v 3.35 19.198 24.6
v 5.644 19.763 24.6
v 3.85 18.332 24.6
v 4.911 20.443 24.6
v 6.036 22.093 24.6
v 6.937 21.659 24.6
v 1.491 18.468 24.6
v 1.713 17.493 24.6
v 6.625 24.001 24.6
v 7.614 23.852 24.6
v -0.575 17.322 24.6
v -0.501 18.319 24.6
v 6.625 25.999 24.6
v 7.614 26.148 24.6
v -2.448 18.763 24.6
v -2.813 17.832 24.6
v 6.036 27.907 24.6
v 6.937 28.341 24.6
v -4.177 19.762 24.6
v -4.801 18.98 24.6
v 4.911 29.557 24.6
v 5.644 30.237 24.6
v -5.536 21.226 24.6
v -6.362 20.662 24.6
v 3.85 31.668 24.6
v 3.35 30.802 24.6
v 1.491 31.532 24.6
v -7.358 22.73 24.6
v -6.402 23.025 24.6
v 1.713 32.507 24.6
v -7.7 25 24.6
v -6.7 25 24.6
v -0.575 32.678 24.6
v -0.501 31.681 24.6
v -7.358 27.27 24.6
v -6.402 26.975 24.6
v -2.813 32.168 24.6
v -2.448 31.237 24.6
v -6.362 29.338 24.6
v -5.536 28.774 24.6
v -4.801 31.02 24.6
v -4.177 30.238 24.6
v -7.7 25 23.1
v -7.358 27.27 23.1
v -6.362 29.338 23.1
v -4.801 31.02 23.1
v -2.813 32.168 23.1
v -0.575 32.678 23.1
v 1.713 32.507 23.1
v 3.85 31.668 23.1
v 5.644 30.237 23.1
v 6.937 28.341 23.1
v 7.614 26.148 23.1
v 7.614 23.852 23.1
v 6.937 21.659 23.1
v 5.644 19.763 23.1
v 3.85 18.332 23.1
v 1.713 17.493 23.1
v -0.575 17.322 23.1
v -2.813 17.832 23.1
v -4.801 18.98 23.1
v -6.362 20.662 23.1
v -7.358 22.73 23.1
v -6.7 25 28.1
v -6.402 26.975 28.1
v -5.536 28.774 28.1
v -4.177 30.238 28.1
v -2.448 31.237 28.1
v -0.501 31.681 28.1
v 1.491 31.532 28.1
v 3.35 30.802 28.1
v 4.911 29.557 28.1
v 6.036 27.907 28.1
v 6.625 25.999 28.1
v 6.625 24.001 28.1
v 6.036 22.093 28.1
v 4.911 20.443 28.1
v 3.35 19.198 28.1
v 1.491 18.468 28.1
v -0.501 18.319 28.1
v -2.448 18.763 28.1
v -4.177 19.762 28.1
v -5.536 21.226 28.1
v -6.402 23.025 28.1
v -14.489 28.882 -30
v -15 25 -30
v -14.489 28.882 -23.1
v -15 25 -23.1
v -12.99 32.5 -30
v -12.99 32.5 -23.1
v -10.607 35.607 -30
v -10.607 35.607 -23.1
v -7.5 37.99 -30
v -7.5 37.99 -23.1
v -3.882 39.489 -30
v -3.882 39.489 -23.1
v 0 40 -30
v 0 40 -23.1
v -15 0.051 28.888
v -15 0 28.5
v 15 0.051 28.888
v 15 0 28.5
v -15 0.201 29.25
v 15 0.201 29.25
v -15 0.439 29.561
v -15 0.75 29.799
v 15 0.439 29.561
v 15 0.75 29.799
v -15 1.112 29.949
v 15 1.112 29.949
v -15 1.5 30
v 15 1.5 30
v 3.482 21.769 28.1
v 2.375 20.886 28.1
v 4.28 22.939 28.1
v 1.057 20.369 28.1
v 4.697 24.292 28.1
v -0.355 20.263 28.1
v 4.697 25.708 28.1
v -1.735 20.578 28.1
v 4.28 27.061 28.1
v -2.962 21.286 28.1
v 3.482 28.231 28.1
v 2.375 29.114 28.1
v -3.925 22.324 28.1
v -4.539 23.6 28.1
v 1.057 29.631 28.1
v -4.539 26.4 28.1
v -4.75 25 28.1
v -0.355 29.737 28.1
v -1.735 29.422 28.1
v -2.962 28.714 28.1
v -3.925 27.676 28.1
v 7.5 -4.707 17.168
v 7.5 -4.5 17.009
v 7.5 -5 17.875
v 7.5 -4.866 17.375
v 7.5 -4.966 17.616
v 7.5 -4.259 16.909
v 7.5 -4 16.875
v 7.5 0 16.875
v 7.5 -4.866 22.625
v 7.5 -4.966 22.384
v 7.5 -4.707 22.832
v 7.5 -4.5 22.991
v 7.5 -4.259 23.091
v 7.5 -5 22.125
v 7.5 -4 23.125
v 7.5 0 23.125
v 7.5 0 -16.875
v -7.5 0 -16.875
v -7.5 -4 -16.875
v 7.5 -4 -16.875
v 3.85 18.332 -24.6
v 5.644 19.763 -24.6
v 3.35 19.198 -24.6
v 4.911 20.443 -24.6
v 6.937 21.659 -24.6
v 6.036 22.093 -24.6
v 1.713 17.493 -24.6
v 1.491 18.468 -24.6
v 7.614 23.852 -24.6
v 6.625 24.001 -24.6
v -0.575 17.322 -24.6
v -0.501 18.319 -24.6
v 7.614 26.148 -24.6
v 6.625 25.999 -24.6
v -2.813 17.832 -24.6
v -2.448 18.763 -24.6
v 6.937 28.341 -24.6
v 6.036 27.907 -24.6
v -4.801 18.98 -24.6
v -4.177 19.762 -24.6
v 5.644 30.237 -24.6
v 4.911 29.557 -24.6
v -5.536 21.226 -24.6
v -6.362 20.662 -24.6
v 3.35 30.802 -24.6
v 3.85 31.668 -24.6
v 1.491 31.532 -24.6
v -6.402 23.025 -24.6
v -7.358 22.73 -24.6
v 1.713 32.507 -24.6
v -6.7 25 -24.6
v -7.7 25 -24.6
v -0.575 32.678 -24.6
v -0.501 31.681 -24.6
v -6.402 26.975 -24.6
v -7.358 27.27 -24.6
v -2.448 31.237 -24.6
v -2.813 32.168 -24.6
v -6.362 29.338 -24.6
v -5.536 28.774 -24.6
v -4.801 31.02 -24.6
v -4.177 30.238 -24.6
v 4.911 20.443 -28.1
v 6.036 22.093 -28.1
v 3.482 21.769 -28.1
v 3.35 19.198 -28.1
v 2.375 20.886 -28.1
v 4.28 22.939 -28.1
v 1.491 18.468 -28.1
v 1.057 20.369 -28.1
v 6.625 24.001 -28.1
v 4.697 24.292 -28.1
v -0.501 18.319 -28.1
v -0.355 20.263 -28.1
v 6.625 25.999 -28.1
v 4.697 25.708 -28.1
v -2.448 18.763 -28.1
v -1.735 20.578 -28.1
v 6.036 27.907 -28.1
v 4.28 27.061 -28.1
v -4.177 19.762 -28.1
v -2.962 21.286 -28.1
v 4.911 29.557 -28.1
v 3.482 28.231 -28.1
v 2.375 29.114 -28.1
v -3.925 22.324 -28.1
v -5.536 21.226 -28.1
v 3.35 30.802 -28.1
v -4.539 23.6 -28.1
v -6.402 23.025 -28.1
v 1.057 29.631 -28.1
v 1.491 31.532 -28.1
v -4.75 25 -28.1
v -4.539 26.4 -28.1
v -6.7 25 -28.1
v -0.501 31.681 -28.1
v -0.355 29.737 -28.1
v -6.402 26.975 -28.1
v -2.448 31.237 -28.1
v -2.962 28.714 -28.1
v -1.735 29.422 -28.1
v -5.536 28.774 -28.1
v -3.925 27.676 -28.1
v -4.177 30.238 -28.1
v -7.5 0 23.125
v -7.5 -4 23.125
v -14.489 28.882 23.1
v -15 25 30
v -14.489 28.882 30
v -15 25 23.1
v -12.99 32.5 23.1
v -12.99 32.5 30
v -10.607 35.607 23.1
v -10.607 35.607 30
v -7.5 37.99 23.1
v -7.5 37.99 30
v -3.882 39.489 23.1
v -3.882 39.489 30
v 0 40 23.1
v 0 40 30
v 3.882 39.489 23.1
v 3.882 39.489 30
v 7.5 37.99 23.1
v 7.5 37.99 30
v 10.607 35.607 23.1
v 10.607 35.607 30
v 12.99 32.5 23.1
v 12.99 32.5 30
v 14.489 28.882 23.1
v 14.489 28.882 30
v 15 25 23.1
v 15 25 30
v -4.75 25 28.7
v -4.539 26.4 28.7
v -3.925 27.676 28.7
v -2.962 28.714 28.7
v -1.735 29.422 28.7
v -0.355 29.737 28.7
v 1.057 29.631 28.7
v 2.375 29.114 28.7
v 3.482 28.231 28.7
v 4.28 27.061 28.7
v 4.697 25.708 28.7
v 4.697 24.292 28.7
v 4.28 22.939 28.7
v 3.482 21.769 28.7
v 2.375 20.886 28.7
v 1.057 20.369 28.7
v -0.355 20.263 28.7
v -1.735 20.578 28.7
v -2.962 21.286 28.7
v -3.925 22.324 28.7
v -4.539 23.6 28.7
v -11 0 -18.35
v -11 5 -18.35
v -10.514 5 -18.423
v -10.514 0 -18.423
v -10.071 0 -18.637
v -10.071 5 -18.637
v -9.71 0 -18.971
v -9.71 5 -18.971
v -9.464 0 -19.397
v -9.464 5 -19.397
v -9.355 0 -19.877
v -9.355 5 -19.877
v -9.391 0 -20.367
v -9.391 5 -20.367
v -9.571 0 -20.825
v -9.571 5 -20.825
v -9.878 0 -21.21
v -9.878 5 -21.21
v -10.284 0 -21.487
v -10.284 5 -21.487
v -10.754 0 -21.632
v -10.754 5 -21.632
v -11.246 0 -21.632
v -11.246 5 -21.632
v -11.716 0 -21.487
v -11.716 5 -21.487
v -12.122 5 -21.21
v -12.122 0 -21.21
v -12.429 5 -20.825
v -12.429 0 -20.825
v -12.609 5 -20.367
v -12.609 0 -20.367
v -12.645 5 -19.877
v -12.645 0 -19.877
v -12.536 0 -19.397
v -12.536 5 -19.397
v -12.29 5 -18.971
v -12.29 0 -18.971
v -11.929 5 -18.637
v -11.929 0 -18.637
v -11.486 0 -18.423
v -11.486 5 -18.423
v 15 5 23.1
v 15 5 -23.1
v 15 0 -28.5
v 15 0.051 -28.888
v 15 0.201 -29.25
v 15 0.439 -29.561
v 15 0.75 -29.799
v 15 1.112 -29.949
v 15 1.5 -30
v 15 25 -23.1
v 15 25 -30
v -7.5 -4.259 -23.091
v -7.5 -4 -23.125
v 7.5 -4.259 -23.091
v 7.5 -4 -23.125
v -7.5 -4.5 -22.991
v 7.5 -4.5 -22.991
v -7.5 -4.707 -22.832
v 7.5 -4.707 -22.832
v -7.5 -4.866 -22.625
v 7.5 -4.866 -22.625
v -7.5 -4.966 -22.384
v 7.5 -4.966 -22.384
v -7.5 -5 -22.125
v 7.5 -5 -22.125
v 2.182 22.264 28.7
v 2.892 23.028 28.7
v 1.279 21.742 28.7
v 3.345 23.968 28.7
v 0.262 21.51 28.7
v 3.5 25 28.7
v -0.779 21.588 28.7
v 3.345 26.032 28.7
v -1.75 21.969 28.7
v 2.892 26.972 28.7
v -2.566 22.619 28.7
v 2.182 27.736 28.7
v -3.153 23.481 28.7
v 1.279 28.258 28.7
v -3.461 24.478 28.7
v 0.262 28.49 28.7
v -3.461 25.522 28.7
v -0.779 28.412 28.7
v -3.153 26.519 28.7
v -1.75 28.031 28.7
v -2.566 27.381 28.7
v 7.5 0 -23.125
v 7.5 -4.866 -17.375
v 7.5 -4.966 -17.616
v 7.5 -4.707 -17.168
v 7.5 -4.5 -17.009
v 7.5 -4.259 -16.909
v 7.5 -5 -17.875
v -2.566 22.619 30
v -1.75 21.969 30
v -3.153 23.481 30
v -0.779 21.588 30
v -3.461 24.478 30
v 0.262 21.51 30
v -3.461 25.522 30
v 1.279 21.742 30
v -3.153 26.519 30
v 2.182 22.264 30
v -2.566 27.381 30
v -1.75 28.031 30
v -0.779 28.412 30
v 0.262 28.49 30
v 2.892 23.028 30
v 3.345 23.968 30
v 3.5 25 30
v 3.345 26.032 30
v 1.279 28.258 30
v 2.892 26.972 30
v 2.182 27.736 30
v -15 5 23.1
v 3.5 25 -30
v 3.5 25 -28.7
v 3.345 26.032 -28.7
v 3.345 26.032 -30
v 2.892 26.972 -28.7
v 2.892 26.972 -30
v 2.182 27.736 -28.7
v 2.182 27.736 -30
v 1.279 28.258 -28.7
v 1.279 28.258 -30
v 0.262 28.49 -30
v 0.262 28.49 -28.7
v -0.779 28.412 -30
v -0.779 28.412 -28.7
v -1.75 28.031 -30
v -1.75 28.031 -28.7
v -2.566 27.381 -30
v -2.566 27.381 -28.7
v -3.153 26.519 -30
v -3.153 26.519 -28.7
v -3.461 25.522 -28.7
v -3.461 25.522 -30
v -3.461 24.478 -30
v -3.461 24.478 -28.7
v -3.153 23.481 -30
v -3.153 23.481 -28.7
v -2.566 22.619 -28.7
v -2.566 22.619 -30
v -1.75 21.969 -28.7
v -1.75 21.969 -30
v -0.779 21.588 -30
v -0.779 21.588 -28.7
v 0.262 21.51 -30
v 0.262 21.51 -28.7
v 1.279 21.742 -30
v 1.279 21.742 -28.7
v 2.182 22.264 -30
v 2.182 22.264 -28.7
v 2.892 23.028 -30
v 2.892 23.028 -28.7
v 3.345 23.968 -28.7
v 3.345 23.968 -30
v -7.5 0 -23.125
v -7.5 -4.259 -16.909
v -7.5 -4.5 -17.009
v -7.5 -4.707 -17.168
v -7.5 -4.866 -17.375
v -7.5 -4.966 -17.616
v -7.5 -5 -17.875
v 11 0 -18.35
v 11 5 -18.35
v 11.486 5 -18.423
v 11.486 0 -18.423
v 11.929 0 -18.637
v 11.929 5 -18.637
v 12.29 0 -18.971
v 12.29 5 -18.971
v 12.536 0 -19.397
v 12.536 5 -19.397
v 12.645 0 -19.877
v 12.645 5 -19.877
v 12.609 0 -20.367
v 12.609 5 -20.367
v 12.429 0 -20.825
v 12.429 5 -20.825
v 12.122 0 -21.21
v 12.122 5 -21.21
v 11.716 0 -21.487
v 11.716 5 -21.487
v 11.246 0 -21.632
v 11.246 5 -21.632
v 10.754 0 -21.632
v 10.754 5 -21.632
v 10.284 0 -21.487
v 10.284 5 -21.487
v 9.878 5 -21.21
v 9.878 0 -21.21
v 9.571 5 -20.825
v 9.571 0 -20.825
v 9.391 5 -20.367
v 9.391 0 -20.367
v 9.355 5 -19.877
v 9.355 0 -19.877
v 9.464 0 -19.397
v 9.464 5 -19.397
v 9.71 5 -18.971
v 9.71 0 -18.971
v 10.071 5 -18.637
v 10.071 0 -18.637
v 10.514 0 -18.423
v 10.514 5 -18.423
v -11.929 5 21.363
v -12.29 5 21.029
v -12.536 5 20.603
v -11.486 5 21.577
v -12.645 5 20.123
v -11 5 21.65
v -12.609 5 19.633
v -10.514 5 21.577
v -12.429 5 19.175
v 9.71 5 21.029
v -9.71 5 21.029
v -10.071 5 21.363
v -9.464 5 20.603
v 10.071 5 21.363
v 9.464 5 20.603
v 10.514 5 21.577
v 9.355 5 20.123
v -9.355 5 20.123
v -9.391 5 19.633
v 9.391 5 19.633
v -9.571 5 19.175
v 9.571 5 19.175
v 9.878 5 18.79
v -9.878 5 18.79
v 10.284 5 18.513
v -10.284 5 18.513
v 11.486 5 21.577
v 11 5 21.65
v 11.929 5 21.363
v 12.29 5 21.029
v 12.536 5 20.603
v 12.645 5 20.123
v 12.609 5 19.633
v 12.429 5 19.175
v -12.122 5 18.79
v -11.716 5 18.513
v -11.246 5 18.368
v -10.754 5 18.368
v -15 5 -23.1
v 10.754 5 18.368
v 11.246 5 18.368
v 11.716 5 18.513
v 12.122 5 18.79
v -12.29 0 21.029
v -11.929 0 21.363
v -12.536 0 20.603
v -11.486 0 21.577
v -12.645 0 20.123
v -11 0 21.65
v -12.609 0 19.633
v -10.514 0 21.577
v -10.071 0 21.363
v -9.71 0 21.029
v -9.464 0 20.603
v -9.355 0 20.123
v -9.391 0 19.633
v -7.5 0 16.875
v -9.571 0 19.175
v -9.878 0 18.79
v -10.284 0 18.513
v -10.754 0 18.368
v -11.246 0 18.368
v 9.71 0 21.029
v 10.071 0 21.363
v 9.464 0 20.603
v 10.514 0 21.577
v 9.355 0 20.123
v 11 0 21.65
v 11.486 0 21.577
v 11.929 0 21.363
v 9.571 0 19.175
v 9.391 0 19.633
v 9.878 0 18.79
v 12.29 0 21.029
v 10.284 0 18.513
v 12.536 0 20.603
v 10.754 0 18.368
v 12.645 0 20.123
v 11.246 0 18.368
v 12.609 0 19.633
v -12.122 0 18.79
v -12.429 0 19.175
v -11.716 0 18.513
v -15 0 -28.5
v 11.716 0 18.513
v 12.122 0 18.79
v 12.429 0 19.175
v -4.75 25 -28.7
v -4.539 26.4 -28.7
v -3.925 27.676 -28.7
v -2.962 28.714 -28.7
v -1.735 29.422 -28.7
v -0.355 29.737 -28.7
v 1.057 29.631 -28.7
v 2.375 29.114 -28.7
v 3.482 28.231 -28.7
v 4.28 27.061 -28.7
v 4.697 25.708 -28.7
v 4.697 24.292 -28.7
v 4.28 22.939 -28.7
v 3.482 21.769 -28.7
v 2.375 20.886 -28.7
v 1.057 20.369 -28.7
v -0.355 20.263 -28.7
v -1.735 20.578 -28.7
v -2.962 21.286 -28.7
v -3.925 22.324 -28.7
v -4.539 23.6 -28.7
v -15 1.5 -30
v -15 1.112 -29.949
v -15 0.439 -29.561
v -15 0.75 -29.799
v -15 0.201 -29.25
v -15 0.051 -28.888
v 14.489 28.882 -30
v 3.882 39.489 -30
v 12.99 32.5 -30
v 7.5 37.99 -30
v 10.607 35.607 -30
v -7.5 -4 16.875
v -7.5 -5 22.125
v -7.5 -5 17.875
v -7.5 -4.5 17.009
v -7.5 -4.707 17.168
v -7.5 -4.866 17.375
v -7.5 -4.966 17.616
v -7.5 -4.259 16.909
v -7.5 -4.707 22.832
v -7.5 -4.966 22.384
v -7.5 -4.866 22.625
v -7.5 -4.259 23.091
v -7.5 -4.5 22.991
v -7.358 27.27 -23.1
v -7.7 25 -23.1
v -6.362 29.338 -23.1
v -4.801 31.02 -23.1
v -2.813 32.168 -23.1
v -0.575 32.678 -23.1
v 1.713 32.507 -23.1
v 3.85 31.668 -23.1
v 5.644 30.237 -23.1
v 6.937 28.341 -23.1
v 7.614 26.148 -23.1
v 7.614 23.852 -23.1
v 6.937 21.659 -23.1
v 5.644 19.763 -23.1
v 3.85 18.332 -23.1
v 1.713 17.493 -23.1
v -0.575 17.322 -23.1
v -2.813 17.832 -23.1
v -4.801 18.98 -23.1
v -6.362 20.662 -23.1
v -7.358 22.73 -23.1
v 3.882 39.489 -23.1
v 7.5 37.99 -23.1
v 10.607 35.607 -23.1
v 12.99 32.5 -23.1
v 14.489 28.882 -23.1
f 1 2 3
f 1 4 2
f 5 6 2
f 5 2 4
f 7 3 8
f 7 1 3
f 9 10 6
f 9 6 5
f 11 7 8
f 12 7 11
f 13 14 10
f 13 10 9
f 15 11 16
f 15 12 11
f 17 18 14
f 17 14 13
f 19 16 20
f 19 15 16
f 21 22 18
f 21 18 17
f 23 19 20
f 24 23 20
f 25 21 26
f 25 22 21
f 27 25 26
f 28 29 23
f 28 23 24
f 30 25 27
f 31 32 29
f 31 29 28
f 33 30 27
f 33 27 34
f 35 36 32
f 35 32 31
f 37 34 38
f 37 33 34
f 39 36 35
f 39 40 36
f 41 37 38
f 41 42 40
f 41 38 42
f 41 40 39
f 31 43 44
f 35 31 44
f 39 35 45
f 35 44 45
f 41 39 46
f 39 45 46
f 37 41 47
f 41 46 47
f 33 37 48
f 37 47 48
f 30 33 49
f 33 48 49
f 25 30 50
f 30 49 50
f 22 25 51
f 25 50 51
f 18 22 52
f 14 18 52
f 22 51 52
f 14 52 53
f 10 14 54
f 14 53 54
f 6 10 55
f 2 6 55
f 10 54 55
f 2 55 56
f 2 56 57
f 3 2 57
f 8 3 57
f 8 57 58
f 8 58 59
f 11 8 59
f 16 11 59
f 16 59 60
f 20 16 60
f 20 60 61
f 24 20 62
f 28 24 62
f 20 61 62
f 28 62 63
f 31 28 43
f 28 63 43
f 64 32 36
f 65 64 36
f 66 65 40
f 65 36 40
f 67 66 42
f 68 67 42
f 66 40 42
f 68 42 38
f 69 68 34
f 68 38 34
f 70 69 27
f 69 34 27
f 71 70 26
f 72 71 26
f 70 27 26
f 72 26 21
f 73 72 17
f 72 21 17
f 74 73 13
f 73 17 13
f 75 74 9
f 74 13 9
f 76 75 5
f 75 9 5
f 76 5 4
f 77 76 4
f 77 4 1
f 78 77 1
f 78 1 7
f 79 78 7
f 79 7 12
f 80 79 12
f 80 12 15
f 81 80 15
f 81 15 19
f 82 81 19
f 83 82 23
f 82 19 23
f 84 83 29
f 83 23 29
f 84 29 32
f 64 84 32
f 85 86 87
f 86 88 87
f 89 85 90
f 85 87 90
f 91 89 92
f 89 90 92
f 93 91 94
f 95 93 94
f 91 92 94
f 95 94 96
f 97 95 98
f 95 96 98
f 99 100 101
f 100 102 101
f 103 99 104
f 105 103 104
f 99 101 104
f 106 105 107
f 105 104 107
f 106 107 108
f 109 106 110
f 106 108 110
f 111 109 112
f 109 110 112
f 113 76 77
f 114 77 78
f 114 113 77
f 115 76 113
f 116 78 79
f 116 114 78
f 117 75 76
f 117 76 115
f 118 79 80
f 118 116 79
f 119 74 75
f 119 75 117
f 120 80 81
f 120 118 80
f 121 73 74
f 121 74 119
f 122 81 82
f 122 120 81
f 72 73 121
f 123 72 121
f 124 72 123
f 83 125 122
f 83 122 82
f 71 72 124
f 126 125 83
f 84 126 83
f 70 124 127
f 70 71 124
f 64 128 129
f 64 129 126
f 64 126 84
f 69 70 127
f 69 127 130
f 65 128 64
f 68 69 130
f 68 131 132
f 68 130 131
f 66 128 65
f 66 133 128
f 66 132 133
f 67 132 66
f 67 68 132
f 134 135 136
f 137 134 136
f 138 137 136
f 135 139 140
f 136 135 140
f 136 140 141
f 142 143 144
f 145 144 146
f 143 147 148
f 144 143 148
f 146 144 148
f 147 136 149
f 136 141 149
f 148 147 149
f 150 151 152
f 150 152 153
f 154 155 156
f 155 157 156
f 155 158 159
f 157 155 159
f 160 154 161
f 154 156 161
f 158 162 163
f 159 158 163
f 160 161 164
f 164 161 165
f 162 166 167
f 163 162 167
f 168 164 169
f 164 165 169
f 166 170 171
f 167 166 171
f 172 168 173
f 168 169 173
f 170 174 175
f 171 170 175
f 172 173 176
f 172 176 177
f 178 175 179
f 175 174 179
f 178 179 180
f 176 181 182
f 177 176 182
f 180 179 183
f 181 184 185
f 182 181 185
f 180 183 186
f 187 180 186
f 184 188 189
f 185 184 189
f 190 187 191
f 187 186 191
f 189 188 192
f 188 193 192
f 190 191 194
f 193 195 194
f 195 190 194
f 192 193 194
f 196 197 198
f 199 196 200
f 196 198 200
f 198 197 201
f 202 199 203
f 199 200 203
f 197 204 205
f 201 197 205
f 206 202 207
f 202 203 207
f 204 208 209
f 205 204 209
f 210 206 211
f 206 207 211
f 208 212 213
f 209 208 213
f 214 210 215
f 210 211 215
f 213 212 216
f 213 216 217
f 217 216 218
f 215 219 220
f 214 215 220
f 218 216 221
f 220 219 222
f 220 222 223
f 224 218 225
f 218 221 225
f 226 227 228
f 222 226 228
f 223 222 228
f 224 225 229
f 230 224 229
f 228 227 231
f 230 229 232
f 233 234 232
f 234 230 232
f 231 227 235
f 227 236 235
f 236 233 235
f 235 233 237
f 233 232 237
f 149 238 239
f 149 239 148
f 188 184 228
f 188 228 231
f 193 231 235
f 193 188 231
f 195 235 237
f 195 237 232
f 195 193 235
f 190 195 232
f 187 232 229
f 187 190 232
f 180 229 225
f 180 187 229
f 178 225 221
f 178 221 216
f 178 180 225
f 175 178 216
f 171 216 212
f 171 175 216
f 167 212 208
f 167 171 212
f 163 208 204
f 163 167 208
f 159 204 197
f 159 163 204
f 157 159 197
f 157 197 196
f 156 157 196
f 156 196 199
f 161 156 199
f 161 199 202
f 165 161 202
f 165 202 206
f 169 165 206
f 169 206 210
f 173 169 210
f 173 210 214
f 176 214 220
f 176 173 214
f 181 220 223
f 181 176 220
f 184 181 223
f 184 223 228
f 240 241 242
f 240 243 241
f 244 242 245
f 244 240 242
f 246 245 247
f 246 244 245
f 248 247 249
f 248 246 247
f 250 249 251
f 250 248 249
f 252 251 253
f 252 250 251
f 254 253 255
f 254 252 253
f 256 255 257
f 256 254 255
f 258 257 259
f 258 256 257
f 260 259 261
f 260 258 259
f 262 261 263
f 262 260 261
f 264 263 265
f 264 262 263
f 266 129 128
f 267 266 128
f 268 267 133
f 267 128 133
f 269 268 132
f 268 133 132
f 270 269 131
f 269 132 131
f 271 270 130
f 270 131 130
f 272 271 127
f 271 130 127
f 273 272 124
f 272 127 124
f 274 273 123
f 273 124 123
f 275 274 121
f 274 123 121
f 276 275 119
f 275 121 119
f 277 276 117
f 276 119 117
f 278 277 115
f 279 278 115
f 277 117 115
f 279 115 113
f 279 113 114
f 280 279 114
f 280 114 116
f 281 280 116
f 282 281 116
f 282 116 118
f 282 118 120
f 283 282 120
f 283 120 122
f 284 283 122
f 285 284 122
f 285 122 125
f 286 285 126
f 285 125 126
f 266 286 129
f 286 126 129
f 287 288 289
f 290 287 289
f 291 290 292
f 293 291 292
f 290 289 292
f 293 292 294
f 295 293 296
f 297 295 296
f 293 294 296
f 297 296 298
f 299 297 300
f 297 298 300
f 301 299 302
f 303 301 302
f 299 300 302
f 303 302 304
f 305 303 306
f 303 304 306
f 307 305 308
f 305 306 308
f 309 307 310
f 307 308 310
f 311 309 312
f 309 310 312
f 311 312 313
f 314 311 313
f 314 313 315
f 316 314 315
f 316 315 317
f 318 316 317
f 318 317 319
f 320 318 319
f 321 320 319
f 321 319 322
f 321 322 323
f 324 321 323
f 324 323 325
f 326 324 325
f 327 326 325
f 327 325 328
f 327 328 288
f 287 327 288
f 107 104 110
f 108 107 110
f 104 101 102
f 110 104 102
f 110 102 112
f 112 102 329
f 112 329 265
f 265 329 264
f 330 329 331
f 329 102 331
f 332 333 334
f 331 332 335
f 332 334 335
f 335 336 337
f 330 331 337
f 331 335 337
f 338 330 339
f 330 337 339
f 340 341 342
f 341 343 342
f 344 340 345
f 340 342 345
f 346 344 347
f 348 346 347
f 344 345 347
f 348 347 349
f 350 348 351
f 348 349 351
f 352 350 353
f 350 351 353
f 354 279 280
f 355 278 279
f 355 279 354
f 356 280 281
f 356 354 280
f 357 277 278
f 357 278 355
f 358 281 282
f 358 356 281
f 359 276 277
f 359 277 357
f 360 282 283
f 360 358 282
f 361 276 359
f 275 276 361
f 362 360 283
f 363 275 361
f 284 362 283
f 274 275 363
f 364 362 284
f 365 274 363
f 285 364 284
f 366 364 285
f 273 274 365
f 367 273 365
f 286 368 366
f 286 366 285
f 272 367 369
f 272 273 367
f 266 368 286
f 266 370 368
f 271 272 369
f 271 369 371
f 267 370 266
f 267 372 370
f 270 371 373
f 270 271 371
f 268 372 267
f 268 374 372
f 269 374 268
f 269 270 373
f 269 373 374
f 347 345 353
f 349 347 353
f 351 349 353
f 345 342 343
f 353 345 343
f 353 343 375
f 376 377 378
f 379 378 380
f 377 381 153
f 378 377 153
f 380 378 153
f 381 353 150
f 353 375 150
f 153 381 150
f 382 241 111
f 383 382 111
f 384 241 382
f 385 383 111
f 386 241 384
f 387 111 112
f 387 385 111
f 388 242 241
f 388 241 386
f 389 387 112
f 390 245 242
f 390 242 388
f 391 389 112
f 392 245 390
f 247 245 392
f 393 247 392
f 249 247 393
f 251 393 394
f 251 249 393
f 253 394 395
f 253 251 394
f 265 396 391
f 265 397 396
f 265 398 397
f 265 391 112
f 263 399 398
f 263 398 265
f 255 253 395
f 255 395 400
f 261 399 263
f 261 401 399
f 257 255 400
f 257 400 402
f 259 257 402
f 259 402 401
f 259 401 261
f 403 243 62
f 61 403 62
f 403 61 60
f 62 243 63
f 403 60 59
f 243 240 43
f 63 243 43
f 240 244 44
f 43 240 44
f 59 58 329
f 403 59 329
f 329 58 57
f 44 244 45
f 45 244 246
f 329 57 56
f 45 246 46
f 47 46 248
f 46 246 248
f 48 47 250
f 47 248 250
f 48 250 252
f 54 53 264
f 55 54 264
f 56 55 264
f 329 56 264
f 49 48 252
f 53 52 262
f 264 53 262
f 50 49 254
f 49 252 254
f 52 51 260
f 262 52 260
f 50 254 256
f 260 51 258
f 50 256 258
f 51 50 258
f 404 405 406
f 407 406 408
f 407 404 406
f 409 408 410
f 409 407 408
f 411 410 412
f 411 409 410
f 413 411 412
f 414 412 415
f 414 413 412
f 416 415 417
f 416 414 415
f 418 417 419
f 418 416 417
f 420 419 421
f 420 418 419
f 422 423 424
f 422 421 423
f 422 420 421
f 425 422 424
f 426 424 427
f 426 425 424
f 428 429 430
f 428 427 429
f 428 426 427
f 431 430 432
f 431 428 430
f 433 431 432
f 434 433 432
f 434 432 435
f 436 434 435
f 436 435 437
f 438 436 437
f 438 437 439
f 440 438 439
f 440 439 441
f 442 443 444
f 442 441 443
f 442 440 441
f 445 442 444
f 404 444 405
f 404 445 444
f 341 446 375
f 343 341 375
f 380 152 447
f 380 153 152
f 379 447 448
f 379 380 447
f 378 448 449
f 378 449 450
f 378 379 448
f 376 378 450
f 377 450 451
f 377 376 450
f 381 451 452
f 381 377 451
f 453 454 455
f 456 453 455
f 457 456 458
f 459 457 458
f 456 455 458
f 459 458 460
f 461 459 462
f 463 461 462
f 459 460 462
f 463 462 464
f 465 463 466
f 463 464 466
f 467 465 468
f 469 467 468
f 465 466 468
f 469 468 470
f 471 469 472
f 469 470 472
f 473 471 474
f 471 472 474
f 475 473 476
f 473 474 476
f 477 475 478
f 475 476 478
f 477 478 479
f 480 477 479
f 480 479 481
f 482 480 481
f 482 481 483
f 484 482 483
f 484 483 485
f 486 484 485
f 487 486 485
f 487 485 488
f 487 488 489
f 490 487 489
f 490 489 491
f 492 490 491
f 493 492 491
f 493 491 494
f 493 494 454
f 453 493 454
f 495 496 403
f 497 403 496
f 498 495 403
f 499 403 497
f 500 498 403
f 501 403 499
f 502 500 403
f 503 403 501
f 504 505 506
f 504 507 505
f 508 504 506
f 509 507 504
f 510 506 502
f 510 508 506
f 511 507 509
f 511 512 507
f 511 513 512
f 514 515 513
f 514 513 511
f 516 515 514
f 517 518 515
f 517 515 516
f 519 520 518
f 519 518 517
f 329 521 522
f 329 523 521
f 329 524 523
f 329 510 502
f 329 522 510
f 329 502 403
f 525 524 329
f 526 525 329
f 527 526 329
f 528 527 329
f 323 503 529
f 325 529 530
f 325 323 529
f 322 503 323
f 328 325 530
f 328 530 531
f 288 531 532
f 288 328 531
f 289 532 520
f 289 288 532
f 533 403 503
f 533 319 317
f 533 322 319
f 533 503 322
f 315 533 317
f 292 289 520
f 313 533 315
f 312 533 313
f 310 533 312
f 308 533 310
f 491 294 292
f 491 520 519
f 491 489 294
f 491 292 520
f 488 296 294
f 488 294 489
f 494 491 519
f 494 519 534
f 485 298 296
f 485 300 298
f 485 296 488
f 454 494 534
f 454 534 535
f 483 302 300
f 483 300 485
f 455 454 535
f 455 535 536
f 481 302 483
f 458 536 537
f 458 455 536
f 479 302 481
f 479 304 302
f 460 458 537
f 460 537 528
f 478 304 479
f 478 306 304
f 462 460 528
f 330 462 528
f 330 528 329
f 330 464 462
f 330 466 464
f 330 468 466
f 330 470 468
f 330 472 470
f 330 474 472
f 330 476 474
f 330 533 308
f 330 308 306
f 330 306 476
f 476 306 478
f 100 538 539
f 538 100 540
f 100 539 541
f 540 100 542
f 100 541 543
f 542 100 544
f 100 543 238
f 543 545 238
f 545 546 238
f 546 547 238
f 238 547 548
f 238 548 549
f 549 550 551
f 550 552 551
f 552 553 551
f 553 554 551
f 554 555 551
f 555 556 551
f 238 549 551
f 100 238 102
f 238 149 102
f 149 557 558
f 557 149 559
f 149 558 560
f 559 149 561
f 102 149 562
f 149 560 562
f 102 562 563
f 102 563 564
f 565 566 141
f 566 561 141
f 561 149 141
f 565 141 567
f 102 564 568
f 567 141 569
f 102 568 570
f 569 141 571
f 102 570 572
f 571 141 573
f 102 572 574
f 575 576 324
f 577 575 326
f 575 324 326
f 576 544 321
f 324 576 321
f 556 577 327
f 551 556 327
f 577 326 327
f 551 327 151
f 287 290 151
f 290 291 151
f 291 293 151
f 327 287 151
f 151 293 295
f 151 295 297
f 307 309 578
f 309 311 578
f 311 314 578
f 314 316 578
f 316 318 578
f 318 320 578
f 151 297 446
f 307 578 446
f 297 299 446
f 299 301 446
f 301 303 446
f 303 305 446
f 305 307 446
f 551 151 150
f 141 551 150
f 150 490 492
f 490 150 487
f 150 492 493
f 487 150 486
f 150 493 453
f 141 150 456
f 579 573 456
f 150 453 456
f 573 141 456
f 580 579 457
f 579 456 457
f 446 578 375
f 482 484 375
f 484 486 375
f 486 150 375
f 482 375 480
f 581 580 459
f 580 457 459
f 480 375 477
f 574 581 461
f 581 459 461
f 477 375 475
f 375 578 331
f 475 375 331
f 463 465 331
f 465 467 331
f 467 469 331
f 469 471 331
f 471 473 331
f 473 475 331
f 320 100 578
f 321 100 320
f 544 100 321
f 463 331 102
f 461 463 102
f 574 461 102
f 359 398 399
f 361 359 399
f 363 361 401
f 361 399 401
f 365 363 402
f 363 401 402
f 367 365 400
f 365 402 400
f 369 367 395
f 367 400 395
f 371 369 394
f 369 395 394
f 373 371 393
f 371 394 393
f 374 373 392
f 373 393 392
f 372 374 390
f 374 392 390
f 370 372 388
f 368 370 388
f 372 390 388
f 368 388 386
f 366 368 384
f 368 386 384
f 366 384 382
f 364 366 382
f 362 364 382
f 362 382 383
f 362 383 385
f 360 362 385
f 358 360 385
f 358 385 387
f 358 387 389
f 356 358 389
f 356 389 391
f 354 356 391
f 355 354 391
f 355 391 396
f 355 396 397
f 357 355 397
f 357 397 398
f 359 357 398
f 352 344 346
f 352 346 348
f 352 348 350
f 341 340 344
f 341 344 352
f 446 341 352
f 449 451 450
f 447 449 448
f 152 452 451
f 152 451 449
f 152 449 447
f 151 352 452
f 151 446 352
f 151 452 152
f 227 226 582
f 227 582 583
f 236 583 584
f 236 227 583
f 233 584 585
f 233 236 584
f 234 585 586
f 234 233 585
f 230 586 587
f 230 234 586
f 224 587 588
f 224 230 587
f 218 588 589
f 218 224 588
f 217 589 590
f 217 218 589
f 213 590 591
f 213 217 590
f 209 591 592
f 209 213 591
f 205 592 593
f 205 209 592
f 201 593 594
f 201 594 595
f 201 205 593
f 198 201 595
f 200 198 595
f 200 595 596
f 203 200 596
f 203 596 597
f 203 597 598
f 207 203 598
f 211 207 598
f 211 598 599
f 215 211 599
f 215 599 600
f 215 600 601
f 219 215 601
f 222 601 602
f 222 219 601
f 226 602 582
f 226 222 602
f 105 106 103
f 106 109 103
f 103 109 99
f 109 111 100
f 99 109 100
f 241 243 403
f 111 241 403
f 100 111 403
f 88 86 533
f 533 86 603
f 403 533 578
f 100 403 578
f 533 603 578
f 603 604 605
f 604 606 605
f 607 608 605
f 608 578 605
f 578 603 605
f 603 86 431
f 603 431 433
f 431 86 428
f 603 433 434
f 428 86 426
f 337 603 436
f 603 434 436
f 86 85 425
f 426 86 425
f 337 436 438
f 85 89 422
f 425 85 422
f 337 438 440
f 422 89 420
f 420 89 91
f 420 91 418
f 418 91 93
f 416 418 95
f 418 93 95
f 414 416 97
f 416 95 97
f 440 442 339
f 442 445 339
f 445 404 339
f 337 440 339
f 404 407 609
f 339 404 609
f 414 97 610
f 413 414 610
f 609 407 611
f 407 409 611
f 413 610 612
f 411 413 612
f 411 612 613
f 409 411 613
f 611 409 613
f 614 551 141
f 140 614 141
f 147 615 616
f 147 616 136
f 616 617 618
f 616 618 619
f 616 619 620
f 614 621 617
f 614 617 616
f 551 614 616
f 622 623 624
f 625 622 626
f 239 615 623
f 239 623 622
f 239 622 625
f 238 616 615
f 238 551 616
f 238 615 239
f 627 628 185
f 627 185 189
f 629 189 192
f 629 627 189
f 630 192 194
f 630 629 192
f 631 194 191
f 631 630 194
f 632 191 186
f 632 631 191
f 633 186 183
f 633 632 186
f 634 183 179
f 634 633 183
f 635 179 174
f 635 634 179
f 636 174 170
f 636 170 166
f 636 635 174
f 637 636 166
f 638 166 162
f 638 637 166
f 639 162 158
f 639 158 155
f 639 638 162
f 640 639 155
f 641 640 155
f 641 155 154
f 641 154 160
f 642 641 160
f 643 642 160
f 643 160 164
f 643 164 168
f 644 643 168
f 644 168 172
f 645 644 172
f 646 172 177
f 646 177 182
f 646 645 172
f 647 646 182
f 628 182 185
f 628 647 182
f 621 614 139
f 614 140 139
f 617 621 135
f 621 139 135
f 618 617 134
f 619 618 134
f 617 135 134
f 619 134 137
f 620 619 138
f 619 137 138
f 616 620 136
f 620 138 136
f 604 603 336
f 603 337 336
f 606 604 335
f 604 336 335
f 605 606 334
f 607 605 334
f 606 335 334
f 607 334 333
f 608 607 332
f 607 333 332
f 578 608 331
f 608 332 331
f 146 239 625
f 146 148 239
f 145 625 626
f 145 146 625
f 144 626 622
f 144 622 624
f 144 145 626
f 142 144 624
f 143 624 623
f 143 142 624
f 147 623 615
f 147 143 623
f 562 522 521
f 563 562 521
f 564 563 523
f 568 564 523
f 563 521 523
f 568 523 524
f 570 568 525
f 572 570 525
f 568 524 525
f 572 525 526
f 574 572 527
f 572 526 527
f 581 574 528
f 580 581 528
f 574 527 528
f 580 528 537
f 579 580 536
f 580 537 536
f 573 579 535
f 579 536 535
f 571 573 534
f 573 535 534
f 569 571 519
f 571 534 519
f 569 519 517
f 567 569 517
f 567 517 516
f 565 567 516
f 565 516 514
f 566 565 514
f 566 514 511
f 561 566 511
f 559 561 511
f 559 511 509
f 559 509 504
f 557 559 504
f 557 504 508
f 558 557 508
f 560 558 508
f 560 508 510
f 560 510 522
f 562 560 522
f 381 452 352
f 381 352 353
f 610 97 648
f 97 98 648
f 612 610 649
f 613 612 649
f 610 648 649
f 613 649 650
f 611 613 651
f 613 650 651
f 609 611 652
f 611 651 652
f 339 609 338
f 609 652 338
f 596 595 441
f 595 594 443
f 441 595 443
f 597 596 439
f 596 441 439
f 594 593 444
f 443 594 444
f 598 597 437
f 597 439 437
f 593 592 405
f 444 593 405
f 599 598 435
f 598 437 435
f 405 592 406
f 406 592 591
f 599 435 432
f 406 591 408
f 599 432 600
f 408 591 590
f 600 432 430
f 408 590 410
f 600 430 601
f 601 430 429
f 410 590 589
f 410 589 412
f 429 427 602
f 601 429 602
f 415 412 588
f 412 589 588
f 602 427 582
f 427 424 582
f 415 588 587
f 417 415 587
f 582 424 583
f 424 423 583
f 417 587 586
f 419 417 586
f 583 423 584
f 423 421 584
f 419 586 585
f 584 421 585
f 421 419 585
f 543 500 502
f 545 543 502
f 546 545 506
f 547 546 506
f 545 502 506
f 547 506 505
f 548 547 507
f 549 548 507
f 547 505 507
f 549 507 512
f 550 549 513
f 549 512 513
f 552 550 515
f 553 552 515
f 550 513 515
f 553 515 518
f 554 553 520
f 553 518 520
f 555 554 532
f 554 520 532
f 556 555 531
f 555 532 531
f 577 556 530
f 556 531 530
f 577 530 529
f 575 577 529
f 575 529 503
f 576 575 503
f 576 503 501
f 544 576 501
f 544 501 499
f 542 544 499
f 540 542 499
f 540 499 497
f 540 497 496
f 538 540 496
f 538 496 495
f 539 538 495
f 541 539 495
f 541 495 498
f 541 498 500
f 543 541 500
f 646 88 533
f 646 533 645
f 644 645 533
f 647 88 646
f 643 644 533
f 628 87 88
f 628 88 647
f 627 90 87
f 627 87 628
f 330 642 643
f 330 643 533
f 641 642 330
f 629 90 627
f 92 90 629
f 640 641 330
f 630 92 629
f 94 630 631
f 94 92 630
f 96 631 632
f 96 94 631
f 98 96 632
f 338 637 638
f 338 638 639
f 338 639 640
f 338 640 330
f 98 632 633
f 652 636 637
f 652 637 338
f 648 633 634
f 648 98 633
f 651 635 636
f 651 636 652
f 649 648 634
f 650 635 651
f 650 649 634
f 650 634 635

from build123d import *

# Parameters (mm, degrees)
SKETCH1_W           = 30
SKETCH1_H           = 60
BOSS_EXTRUDE1_DEPTH = 5
SKETCH3_R           = 3.5
BOSS_EXTRUDE2_DEPTH = 6.9
SKETCH4_R           = 7.7
CUT_EXTRUDE1_DEPTH  = 1.5
SKETCH6_R           = 6.7
CUT_EXTRUDE2_DEPTH  = 3.5
SKETCH9_R           = 4.75
CUT_EXTRUDE4_DEPTH  = 0.6
FILLET1_R           = 15
SKETCH15_R          = 1.65
CUT_EXTRUDE5_DEPTH  = 10
SKETCH16_W          = 15
SKETCH16_H          = 6.25
BOSS_EXTRUDE3_DEPTH = 5
FILLET2_R           = 1.5
FILLET3_R           = 1


with BuildPart() as part:
    # Sketch1 → Boss-Extrude1 (new body)
    with BuildSketch(Plane(origin=(0, 0, 0), x_dir=(1, 0, 0), z_dir=(0, 1, 0))):
        Rectangle(SKETCH1_W, SKETCH1_H)
    extrude(amount=BOSS_EXTRUDE1_DEPTH)

    # Sketch3 → Boss-Extrude2 (add)
    with BuildSketch(Plane.XY.offset(30)):
        Polygon((-15, 5), (15, 5), (15, 25), (15, 40), (-15, 40), (-15, 25), align=None)
        with Locations((0, 25)):
            Circle(SKETCH3_R, mode=Mode.SUBTRACT)
    boss_extrude2 = extrude(amount=-BOSS_EXTRUDE2_DEPTH)

    # Sketch4 → Cut-Extrude1 (cut)
    with BuildSketch(Plane(origin=(0, 0, 23.1), x_dir=(-1, 0, 0), z_dir=(0, 0, -1))):
        with Locations((0, 25)):
            Circle(SKETCH4_R)
    cut_extrude1 = extrude(amount=-CUT_EXTRUDE1_DEPTH, mode=Mode.SUBTRACT)

    # Sketch6 → Cut-Extrude2 (cut)
    with BuildSketch(Plane(origin=(0, 0, 24.6), x_dir=(-1, 0, 0), z_dir=(0, 0, -1))):
        with Locations((0, 25)):
            Circle(SKETCH6_R)
    cut_extrude2 = extrude(amount=-CUT_EXTRUDE2_DEPTH, mode=Mode.SUBTRACT)

    # Sketch9 → Cut-Extrude4 (cut)
    with BuildSketch(Plane(origin=(0, 0, 28.1), x_dir=(-1, 0, 0), z_dir=(0, 0, -1))):
        with Locations((0, 25)):
            Circle(SKETCH9_R)
    cut_extrude4 = extrude(amount=-CUT_EXTRUDE4_DEPTH, mode=Mode.SUBTRACT)

    # Mirror2: Boss-Extrude2, Cut-Extrude1, Cut-Extrude2, Cut-Extrude4 across plane
    add(boss_extrude2.mirror(Plane.XY))
    add(cut_extrude1.mirror(Plane.XY), mode=Mode.SUBTRACT)
    add(cut_extrude2.mirror(Plane.XY), mode=Mode.SUBTRACT)
    add(cut_extrude4.mirror(Plane.XY), mode=Mode.SUBTRACT)

    # Fillet1
    fillet1_edges = [part.edges().sort_by_distance(p)[0] for p in [
        (-15, 40, -26.55),
        (15, 40, -26.55),
        (-15, 40, 26.55),
        (15, 40, 26.55),
    ]]
    fillet(fillet1_edges, radius=FILLET1_R - 0.0001)  # a hair under: the kernel refuses the full size

    # Sketch15 → Cut-Extrude5 (cut)
    with BuildSketch(Plane(origin=(0, 5, 0), x_dir=(1, 0, 0), z_dir=(0, 1, 0))):
        with Locations(Location((-11, -20, 0), (0, 0, 270))):
            Circle(SKETCH15_R)
        with Locations(Location((11, -20, 0), (0, 0, 270))):
            Circle(SKETCH15_R)
        with Locations(Location((-11, 20, 0), (0, 0, 270))):
            Circle(SKETCH15_R)
        with Locations(Location((11, 20, 0), (0, 0, 270))):
            Circle(SKETCH15_R)
    extrude(amount=-CUT_EXTRUDE5_DEPTH, mode=Mode.SUBTRACT)

    # Sketch16 → Boss-Extrude3 (add)
    with BuildSketch(Plane.XZ):
        with Locations((0, 20)):
            Rectangle(SKETCH16_W, SKETCH16_H)
        with Locations((0, -20)):
            Rectangle(SKETCH16_W, SKETCH16_H)
    extrude(amount=BOSS_EXTRUDE3_DEPTH)

    # Fillet2
    fillet2_edges = [part.edges().sort_by_distance(p)[0] for p in [
        (0, 0, -30),
        (0, 0, 30),
    ]]
    fillet(fillet2_edges, radius=FILLET2_R)

    # Fillet3
    fillet3_edges = [part.edges().sort_by_distance(p)[0] for p in [
        (0, -5, 23.125),
        (0, -5, 16.875),
        (0, -5, -16.875),
        (0, -5, -23.125),
    ]]
    fillet(fillet3_edges, radius=FILLET3_R)


solid = part.part
